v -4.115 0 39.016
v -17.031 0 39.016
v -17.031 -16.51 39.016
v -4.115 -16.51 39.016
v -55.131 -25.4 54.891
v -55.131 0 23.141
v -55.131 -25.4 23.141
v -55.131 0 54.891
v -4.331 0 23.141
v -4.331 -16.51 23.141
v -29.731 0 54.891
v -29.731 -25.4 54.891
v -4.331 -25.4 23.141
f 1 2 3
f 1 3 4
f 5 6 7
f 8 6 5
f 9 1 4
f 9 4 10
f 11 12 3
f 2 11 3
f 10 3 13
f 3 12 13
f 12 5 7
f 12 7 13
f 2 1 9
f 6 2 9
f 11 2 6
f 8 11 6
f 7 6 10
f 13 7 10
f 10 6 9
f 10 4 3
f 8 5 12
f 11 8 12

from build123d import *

# Parameters (mm, degrees)
F0_W     = 50.8
F0_H     = 31.75
F1_DEPTH = 25.4
F3_DEPTH = 25.401
F5_DEPTH = 16.51


with BuildPart() as f1:
    # F0 (on Front) → F1 (new body)
    with BuildSketch(Plane.XZ):
        with Locations((-29.731384, 39.01551)):
            Rectangle(F0_W, F0_H)
    extrude(amount=F1_DEPTH)

    # F2 (on face) → F3 (cut, through all)
    with BuildSketch(Plane.XZ.offset(25.4)):
        Polygon((-4.331384, 54.89051), (-29.731384, 54.89051), (-4.331384, 23.14051), align=None)
    extrude(amount=-F3_DEPTH, mode=Mode.SUBTRACT)

    # F4 (on face) → F5 (join)
    with BuildSketch(Plane(origin=(0, 0, 0), x_dir=(-1, 0, 0), z_dir=(0, 1, 0))):
        Polygon((4.331384, 23.14051), (17.031384, 39.01551), (4.114715, 39.01551), align=None)
    extrude(amount=-F5_DEPTH)


solid = f1.part
